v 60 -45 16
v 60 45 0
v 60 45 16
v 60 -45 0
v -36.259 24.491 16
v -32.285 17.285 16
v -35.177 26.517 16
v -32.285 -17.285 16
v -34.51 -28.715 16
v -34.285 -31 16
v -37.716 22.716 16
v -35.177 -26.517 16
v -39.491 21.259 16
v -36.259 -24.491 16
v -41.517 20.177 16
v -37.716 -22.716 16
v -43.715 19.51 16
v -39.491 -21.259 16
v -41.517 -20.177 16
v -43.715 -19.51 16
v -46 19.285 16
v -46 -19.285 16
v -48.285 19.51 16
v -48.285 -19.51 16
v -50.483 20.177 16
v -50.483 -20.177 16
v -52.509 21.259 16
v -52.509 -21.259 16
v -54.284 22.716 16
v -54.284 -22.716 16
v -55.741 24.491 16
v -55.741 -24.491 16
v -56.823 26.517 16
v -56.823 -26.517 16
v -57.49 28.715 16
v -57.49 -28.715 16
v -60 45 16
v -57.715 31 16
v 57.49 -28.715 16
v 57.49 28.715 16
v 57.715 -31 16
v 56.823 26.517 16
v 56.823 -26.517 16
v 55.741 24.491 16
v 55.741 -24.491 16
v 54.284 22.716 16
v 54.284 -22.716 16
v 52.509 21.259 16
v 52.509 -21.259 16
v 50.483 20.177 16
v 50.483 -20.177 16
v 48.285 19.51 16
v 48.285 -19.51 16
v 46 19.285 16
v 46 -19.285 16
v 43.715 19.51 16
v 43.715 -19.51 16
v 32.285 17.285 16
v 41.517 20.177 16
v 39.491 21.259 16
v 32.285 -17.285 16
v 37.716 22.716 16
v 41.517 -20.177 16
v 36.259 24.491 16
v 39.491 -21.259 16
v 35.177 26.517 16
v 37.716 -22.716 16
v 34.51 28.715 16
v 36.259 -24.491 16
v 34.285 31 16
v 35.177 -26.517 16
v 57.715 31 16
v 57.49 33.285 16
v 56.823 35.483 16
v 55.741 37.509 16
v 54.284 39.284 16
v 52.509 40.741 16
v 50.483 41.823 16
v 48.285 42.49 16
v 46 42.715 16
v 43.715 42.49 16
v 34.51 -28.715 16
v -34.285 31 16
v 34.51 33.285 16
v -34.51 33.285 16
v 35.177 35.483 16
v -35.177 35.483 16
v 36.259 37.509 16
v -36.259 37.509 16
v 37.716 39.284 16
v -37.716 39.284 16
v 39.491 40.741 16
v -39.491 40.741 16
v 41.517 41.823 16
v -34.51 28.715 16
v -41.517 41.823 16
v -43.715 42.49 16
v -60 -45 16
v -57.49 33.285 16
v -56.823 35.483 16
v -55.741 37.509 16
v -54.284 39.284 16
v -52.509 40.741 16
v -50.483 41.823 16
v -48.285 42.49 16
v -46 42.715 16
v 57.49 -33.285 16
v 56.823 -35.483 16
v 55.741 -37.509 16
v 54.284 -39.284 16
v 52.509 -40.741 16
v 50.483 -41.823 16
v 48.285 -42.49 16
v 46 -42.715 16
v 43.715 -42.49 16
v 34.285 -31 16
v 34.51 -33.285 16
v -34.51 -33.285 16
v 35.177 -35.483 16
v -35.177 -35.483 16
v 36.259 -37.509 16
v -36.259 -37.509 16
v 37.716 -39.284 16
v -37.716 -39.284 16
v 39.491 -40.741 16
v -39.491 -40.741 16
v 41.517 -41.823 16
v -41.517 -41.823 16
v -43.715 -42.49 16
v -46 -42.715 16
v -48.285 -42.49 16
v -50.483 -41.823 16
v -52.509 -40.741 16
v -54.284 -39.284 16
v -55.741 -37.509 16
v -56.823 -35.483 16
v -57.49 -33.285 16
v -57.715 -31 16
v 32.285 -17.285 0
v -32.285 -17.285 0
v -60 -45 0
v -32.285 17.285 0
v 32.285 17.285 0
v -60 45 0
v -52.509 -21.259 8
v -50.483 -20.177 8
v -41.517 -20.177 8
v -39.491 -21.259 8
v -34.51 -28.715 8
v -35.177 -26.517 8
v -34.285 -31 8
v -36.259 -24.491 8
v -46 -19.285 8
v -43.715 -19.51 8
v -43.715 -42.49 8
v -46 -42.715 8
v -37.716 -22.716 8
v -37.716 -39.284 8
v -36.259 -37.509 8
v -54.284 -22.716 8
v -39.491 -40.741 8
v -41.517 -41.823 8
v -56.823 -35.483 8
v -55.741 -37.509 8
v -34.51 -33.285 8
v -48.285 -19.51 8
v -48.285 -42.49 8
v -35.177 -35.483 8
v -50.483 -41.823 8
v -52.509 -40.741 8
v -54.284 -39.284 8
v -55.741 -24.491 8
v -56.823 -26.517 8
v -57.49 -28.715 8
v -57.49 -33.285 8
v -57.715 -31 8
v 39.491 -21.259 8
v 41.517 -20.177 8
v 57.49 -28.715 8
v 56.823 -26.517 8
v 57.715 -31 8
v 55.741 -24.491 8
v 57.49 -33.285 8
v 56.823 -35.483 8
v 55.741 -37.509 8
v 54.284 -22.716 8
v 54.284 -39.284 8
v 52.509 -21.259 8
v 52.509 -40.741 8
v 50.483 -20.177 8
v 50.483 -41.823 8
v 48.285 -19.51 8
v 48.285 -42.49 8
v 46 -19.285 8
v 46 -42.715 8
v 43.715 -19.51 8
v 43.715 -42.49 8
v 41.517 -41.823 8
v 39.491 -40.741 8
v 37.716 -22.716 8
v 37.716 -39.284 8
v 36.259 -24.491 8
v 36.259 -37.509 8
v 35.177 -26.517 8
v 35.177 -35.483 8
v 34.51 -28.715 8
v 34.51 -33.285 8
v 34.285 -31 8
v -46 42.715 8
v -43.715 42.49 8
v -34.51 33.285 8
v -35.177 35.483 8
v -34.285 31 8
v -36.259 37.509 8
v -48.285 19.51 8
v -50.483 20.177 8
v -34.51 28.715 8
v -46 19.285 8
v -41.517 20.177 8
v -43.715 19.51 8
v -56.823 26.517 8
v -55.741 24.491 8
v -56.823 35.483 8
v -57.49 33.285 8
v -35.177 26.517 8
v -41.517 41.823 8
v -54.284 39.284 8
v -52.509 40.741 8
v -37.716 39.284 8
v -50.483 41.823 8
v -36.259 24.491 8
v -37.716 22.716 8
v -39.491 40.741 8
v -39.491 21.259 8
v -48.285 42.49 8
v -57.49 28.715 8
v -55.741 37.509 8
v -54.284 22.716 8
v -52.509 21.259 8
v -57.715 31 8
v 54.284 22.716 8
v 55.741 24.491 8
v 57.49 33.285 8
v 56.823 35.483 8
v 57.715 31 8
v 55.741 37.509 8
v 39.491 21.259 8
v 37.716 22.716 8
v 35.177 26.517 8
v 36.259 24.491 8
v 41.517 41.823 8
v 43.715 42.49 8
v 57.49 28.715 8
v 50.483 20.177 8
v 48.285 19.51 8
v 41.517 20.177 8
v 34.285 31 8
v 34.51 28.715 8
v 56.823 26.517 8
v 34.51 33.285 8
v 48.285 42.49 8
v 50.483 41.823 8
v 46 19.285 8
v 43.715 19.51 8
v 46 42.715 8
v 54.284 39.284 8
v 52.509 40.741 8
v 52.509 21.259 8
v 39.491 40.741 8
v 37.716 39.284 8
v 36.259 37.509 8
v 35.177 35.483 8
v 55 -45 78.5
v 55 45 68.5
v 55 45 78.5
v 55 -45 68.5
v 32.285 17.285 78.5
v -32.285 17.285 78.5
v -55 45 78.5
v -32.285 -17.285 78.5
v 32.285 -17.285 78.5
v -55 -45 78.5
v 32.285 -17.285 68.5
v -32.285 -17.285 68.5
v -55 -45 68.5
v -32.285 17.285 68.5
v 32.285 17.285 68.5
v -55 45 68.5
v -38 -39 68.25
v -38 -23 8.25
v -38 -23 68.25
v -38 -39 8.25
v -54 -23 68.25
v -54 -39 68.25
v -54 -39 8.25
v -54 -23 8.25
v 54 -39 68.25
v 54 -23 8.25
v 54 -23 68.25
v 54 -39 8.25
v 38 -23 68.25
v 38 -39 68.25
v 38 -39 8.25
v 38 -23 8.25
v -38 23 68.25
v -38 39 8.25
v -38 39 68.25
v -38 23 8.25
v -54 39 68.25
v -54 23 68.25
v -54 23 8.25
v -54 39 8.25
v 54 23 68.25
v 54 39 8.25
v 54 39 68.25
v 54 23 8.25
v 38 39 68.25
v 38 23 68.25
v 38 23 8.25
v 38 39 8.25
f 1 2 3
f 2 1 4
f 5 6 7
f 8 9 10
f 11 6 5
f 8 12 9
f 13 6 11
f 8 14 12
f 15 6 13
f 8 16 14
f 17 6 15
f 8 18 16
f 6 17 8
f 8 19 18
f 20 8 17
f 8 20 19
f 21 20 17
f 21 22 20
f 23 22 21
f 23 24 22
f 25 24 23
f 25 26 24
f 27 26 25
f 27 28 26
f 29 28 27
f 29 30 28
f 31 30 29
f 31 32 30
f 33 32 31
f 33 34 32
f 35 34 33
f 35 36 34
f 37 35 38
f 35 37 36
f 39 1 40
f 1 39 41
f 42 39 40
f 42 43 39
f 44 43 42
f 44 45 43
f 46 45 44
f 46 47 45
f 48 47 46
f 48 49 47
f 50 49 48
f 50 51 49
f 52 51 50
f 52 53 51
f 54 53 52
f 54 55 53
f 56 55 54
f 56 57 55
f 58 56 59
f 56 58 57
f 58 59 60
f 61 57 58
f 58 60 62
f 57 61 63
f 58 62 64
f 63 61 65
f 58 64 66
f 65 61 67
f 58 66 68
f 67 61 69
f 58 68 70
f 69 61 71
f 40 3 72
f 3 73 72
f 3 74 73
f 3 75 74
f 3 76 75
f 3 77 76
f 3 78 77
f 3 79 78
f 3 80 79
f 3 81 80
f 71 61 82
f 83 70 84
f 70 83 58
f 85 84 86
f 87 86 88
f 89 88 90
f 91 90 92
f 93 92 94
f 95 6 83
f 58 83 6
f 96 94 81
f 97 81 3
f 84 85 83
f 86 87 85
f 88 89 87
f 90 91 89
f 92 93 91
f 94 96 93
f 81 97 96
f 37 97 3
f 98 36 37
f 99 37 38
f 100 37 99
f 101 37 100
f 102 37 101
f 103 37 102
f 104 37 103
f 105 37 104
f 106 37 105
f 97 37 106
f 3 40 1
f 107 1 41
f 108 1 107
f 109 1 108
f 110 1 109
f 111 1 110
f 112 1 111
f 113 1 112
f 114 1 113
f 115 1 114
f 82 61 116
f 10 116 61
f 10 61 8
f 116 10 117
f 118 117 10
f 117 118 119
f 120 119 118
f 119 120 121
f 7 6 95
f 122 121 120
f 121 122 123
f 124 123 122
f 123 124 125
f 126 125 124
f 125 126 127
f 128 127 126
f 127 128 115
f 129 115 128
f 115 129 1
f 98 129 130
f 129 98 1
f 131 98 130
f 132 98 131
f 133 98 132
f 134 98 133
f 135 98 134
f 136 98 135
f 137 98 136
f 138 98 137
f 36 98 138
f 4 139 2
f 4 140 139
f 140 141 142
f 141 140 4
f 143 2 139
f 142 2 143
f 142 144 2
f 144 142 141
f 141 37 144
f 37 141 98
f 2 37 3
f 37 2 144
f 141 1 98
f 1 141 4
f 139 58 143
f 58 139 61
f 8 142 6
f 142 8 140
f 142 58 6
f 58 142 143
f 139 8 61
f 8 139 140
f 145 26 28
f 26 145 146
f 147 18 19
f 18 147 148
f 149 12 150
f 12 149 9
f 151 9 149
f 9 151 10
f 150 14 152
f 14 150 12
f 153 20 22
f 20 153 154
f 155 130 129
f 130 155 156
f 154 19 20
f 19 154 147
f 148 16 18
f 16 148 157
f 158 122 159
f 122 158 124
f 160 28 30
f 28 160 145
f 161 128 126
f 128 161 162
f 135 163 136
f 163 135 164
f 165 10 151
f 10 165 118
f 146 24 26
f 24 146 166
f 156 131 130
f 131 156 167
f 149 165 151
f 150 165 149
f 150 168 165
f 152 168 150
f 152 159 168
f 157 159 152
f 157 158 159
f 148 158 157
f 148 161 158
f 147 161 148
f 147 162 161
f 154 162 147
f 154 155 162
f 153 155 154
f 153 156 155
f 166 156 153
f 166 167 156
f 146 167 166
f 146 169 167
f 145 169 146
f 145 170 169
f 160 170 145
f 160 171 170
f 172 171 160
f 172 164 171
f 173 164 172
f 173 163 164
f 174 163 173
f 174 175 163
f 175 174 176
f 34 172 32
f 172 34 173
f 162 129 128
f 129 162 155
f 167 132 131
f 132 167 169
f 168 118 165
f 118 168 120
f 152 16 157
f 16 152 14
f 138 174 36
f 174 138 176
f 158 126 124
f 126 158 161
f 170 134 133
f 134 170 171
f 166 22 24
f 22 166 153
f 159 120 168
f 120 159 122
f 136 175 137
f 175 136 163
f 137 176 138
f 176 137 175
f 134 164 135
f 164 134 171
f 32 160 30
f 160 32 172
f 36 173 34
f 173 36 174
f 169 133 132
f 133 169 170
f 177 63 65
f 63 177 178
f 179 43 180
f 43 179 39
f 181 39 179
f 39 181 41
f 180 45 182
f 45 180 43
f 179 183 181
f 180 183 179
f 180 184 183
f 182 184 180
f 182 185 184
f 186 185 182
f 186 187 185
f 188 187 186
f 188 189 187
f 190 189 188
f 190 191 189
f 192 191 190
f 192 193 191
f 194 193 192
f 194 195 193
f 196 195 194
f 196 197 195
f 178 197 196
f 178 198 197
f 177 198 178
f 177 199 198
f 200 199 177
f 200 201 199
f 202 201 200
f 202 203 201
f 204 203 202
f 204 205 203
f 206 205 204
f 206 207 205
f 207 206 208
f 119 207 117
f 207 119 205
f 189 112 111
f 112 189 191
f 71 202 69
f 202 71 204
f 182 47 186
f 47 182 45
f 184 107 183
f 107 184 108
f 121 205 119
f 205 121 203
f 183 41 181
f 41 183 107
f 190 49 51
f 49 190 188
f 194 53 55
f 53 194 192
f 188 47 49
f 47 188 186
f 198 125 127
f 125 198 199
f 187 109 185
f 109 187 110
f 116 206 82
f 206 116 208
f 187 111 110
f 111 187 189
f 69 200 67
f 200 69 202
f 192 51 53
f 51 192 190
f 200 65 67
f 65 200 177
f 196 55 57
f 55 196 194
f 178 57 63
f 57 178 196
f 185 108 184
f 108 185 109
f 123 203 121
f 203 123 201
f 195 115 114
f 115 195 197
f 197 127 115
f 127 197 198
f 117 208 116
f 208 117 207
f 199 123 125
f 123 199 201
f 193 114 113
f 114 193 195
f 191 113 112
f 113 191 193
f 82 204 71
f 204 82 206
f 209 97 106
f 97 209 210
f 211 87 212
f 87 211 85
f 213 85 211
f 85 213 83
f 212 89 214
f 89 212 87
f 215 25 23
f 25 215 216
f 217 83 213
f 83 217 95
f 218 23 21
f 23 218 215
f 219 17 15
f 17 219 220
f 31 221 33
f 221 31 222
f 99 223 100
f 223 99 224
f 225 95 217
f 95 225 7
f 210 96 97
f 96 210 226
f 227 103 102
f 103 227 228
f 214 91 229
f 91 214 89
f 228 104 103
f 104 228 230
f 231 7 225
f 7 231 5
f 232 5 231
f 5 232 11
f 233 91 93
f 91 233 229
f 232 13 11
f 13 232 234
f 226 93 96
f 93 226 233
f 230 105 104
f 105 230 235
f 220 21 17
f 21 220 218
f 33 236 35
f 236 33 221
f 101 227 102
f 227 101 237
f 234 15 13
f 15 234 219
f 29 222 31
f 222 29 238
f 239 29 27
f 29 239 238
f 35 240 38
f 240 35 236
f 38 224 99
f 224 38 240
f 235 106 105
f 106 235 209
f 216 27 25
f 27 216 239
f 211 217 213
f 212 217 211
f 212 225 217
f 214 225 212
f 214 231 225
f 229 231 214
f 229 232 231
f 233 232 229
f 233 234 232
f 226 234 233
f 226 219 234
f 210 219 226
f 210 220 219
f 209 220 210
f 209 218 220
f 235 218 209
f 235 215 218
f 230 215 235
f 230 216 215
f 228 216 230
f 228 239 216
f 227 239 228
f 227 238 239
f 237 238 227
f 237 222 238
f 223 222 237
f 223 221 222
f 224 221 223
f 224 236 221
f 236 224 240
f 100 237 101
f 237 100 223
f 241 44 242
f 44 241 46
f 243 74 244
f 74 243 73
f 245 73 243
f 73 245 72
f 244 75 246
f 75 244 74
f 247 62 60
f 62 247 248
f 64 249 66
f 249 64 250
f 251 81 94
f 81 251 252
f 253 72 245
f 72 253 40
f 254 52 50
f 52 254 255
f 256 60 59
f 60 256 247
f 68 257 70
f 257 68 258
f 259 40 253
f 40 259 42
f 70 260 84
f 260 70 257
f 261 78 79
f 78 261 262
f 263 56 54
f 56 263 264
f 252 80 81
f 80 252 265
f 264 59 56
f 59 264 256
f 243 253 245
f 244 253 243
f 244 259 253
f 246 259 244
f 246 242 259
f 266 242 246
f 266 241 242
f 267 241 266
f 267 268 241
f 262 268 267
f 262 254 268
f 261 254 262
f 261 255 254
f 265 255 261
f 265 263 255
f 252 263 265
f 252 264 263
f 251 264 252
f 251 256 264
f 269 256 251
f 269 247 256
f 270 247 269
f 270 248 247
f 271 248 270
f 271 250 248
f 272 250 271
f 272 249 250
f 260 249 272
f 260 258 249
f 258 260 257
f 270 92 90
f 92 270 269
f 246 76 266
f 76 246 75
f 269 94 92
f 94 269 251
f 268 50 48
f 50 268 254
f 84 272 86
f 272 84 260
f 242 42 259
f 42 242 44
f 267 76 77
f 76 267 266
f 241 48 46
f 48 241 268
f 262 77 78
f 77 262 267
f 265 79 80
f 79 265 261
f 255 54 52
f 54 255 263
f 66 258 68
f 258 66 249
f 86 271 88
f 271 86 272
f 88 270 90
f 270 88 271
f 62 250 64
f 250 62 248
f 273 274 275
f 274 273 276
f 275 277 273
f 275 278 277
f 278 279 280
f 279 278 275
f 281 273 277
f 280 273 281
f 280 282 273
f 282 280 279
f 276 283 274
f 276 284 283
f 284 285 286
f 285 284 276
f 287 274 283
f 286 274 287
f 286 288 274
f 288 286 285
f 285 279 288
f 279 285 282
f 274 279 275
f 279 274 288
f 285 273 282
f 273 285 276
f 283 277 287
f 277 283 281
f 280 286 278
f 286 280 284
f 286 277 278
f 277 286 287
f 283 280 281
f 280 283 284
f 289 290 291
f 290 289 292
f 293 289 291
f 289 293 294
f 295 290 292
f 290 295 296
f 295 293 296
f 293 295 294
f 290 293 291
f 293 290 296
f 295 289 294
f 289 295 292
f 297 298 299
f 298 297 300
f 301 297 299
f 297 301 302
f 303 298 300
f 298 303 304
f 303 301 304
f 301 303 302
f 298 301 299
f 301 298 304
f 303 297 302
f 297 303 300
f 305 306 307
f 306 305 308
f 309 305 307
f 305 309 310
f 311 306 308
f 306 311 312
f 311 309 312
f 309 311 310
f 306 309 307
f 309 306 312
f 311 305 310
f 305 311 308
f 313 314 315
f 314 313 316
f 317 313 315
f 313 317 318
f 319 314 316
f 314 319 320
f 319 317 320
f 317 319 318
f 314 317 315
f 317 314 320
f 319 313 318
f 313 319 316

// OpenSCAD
$fn = 32;

// ------------------------------------------------------------------------
// Frame cube: base 120 x 90 mm, posts 60 mm tall
// Every part is its own module, assembly() places every instance.
// ------------------------------------------------------------------------

// --- part 1 ---
module base_frame() {
  difference() {
    translate([-60, -45, 0]) cube([120, 90, 16]);
    translate([-32.285, -17.285, -1]) cube([64.57, 34.57, 18]);
    translate([-46, -31, 8]) cylinder(h = 9, d = 23.43);
    translate([46, -31, 8]) cylinder(h = 9, d = 23.43);
    translate([-46, 31, 8]) cylinder(h = 9, d = 23.43);
    translate([46, 31, 8]) cylinder(h = 9, d = 23.43);
  }
}

// --- part 2 ---
module corner_post() {
  translate([-8, -8, 0]) cube([16, 16, 60]);
}

// --- part 3 ---
module top_frame() {
  difference() {
    translate([-55, -45, 0]) cube([110, 90, 10]);
    translate([-32.285, -17.285, -1]) cube([64.57, 34.57, 12]);
  }
}

// --- assembly ---
module assembly() {
  color([0.80, 0.24, 0.20]) translate([0, 0, 0]) rotate([0, 0, 0]) base_frame();
  color([0.20, 0.45, 0.75]) translate([-46, -31, 8.25]) rotate([0, 0, 0]) corner_post();
  color([0.25, 0.62, 0.32]) translate([46, -31, 8.25]) rotate([0, 0, 0]) corner_post();
  color([0.92, 0.70, 0.18]) translate([-46, 31, 8.25]) rotate([0, 0, 0]) corner_post();
  color([0.58, 0.35, 0.70]) translate([46, 31, 8.25]) rotate([0, 0, 0]) corner_post();
  color([0.16, 0.66, 0.66]) translate([0, 0, 68.5]) rotate([0, 0, 0]) top_frame();
}

assembly();
